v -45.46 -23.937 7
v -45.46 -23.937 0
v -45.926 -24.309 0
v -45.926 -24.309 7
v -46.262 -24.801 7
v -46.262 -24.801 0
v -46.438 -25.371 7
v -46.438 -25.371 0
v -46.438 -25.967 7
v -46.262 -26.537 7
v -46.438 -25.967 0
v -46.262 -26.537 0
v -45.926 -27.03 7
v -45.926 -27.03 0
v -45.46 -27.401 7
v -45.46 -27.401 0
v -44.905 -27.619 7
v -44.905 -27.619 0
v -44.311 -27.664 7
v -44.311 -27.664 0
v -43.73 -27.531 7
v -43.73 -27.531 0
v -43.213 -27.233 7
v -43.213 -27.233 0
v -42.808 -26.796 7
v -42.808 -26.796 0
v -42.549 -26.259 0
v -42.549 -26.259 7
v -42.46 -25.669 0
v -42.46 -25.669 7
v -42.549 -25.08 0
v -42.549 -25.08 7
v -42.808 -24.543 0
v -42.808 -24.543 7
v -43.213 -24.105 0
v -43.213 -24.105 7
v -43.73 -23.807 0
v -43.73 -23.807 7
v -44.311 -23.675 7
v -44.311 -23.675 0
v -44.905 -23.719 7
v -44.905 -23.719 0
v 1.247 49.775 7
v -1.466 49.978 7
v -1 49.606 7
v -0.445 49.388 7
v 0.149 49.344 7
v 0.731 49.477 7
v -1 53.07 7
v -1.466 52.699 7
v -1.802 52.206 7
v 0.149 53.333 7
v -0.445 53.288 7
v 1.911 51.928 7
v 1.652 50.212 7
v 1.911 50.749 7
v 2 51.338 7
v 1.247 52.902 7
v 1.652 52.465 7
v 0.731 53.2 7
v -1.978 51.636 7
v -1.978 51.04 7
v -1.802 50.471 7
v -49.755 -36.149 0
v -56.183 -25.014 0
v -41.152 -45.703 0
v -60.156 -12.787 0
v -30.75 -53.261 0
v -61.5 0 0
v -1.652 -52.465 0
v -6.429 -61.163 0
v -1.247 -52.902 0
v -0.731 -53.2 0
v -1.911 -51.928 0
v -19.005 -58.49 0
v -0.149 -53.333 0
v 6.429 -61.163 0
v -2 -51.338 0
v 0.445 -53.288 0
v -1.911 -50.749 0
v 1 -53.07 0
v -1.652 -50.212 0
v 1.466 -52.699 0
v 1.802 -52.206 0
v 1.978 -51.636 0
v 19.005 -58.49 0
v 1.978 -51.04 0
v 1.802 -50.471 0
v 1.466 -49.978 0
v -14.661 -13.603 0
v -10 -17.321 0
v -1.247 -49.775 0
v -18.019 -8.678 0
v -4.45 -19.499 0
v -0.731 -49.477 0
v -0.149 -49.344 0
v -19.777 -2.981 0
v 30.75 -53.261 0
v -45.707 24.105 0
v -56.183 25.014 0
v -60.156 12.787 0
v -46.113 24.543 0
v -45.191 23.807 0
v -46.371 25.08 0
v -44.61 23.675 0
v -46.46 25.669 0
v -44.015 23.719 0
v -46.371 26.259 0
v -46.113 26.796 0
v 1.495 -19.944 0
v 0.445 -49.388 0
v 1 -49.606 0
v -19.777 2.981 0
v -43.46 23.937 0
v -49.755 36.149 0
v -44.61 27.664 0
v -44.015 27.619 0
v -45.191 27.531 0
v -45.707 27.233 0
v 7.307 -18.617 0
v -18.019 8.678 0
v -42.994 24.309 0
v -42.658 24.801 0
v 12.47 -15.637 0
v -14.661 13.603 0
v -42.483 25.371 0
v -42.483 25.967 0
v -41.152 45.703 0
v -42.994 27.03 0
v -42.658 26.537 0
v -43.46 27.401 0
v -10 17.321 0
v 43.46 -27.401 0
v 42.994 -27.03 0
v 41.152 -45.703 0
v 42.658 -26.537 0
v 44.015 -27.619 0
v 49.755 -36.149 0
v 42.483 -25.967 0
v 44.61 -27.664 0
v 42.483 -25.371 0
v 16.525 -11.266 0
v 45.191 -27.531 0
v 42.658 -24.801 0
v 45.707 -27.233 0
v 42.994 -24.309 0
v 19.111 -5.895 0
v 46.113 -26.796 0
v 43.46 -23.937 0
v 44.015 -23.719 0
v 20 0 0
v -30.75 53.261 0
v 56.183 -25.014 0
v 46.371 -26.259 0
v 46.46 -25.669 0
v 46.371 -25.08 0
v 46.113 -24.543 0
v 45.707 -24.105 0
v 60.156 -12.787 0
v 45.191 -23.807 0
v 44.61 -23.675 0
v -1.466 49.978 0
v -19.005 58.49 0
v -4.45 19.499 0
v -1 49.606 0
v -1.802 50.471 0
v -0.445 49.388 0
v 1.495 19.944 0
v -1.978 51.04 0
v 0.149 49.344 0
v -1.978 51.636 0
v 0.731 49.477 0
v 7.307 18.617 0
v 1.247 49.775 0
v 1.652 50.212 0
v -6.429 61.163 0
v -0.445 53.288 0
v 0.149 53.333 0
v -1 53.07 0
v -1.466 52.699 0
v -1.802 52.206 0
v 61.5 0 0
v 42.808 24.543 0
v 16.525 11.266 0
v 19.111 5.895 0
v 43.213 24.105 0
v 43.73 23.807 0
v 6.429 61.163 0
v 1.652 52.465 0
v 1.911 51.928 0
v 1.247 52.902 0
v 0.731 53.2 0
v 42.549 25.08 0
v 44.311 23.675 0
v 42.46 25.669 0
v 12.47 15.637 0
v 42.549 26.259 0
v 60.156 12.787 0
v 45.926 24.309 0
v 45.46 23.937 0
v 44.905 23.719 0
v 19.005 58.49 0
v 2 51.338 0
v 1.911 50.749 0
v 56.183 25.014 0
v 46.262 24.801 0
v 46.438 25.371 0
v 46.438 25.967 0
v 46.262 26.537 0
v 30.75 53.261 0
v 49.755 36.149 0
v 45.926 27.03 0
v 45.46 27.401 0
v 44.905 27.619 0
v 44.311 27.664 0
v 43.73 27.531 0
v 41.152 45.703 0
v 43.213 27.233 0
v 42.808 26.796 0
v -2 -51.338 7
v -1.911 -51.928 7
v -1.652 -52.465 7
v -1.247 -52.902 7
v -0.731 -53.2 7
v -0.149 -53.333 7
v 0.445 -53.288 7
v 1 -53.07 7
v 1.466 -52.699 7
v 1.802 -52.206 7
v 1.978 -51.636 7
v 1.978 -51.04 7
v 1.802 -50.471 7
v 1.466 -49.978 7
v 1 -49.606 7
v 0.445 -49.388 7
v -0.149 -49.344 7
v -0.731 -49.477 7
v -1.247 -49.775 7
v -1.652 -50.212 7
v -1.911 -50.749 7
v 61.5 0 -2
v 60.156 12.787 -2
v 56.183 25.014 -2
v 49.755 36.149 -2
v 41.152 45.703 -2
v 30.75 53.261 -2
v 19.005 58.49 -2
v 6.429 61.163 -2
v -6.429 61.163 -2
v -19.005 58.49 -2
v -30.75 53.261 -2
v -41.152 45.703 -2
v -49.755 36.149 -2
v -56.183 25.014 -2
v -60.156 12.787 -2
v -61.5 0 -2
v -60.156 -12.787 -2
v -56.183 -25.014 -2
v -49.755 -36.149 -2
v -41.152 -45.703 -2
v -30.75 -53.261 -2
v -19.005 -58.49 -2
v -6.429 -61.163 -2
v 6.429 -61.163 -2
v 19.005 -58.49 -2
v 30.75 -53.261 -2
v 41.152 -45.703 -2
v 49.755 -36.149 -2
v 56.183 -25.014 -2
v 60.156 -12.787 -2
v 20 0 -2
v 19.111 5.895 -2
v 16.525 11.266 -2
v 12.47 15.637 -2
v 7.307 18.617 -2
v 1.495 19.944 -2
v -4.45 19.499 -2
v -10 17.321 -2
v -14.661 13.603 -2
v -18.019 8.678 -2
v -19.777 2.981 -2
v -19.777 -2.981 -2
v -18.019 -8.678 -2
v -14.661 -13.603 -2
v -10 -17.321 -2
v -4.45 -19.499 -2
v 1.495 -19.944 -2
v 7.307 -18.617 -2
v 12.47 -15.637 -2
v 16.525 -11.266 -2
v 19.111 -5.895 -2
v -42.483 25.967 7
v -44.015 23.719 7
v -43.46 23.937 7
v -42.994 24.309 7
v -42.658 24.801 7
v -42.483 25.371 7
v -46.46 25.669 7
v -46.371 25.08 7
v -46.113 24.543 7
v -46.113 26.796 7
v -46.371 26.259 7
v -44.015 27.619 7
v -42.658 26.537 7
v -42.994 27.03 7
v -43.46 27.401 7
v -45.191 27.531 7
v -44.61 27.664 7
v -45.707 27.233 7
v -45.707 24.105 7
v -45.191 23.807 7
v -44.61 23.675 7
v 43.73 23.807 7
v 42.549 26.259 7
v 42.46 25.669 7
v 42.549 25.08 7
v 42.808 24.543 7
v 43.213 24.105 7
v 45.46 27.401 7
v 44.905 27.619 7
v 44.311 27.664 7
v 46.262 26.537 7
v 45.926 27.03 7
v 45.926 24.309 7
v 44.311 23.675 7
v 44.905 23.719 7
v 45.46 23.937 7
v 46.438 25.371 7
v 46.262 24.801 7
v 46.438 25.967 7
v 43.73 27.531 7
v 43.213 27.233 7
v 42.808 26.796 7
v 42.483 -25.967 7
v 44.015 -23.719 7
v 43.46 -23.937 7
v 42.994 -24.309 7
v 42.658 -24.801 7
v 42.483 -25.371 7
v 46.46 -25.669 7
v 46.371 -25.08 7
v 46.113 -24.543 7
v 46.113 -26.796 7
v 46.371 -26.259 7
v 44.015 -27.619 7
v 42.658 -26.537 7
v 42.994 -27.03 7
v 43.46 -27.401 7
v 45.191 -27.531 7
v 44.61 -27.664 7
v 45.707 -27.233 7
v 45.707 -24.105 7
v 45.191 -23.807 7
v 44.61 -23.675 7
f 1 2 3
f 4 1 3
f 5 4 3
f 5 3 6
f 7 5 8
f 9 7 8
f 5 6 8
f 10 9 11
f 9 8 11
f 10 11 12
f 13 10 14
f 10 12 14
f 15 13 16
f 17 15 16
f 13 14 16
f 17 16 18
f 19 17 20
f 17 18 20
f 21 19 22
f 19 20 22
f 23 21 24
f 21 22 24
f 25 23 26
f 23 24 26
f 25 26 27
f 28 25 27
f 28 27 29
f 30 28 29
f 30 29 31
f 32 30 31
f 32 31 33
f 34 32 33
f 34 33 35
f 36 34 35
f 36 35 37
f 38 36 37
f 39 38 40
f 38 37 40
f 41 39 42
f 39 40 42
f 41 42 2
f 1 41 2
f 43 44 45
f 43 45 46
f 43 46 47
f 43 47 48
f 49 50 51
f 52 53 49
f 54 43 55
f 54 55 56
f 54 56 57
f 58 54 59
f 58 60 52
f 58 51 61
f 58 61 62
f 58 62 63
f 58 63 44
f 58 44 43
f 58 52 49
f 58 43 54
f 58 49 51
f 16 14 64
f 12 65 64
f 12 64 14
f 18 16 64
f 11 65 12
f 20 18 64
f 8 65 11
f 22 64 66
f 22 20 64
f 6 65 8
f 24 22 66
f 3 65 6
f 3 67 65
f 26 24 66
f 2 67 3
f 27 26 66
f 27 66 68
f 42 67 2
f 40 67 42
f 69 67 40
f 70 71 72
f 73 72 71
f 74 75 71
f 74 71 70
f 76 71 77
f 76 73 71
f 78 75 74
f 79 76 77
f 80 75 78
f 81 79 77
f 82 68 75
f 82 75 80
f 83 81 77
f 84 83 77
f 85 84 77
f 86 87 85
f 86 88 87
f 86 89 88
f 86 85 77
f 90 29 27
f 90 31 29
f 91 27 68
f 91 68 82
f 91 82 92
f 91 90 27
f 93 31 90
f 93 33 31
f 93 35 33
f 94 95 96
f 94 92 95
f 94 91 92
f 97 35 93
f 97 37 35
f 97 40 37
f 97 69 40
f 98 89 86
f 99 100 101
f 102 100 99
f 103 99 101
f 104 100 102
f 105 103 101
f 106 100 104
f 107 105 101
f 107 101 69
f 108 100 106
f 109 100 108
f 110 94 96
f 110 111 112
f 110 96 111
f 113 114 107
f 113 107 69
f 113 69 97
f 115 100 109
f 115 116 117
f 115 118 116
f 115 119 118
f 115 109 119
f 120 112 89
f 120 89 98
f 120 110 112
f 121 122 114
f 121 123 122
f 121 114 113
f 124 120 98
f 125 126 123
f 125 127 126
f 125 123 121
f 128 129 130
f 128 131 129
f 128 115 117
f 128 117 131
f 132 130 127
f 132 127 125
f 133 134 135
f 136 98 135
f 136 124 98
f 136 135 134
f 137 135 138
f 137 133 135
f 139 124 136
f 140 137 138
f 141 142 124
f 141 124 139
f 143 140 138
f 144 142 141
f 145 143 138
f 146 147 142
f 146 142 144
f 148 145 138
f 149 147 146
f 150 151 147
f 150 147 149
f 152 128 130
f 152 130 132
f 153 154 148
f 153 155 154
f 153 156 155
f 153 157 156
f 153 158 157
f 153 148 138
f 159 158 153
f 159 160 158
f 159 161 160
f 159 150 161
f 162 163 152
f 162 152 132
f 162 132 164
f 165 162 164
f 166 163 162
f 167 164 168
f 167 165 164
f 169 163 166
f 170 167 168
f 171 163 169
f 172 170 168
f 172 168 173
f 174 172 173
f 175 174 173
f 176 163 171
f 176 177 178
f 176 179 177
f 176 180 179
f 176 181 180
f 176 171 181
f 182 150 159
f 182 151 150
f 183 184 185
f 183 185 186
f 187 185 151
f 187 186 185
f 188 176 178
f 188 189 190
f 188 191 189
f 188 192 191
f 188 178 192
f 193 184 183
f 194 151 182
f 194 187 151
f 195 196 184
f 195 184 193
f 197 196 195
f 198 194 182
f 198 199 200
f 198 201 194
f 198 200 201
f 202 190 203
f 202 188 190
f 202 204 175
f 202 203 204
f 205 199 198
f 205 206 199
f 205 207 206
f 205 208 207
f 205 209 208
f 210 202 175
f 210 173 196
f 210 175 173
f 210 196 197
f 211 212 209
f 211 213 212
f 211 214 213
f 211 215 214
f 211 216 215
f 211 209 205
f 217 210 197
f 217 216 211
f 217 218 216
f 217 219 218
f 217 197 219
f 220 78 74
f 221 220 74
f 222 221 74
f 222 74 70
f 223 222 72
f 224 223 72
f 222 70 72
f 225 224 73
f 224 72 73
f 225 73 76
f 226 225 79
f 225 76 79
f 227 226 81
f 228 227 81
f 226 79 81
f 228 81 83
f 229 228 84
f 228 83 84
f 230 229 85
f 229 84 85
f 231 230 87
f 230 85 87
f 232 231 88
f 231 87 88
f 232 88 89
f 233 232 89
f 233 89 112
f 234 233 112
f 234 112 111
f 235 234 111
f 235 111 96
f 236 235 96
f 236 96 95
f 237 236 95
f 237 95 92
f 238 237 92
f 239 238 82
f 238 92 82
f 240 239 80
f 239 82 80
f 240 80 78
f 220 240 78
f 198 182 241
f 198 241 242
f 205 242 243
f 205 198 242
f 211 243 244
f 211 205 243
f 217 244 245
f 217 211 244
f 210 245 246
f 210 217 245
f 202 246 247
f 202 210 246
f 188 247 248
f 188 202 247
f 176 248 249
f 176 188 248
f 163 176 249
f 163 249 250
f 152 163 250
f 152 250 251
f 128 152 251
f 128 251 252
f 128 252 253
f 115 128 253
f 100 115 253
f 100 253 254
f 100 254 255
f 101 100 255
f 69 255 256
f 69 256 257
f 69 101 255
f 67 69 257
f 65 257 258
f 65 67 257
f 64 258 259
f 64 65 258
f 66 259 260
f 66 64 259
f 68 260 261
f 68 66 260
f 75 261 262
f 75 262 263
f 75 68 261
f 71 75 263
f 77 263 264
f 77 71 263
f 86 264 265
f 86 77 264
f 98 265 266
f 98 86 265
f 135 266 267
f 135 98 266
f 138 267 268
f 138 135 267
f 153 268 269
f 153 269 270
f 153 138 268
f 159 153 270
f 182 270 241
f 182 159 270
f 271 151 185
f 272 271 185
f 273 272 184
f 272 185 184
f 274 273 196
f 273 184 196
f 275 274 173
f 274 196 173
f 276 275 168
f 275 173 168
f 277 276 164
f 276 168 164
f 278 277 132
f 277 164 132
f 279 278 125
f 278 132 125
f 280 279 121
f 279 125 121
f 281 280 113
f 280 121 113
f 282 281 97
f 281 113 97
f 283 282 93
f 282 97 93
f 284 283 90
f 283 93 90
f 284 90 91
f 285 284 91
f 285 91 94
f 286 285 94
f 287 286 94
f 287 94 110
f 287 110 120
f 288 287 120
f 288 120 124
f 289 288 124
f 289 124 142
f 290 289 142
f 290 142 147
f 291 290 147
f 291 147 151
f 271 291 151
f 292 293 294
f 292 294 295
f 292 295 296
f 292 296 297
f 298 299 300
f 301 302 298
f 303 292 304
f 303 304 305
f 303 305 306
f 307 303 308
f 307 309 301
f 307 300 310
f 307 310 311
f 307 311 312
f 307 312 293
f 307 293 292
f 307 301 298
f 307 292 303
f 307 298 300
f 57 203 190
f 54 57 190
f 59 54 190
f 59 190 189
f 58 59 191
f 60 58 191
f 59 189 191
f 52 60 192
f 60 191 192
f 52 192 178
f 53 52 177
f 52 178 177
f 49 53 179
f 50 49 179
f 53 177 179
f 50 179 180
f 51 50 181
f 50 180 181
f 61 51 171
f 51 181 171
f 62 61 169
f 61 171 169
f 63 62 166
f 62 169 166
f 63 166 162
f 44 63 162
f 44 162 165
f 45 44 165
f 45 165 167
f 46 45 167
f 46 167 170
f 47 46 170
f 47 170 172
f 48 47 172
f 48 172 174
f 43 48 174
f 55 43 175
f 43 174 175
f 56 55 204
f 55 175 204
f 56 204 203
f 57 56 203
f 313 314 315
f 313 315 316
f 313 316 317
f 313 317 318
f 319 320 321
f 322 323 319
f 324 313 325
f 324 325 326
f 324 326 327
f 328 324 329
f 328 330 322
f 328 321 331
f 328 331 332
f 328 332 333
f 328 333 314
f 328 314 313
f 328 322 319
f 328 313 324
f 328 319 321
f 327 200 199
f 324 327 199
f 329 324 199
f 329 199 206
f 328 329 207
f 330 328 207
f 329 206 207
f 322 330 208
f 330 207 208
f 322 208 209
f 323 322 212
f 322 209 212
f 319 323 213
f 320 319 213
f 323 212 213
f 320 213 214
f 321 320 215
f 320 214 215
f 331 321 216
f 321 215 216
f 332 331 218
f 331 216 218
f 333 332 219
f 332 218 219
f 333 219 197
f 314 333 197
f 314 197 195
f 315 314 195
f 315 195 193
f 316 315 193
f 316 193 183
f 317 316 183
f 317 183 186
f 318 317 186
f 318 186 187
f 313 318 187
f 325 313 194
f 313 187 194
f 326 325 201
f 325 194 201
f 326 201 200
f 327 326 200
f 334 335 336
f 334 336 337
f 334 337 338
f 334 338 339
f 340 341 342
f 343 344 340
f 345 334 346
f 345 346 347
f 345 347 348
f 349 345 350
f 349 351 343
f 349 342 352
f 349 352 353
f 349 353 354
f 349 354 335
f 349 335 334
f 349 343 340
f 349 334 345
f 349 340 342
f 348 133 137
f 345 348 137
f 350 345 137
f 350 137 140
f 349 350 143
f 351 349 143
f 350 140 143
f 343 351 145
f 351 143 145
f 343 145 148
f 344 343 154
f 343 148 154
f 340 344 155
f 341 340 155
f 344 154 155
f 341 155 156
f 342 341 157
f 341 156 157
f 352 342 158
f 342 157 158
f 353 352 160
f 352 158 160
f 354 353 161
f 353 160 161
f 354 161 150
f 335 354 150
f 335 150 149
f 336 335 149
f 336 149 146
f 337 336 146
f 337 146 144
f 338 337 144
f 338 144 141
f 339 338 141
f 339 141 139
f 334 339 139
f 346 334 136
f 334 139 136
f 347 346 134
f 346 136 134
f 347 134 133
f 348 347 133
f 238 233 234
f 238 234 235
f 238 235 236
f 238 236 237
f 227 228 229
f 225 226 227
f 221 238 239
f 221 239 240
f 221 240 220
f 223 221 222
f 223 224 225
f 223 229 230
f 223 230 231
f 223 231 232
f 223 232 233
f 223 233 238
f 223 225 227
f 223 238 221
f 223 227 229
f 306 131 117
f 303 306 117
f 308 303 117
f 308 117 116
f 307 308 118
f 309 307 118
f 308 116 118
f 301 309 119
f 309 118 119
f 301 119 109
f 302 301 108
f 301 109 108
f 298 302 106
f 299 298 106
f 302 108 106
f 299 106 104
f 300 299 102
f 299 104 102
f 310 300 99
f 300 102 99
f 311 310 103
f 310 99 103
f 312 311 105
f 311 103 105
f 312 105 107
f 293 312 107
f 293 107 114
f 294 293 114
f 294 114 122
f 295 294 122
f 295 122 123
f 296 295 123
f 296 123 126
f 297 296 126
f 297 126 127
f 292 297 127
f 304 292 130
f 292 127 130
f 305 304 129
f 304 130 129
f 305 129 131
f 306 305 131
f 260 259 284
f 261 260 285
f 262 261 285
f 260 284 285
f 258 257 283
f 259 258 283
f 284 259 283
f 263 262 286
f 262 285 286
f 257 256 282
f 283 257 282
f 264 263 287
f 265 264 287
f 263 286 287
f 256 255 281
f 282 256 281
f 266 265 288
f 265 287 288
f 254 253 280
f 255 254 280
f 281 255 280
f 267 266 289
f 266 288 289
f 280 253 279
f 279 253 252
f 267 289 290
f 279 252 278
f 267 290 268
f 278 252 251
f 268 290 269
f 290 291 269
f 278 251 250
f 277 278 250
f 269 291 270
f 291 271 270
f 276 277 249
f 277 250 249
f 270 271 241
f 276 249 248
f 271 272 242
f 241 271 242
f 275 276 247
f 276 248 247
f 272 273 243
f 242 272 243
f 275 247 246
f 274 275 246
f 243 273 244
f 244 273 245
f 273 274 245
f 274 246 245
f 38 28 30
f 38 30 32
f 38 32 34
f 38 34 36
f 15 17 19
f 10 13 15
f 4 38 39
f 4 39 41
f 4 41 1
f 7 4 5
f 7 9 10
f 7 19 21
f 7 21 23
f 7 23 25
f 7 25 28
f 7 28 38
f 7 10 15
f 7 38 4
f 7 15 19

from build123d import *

# Parameters (mm, degrees)
SKETCH1_R           = 61.5
BOSS_EXTRUDE1_DEPTH = 2
SKETCH2_R           = 2
BOSS_EXTRUDE2_DEPTH = 7
CIRPATTERN1_COUNT   = 6
SKETCH1_3_R         = 20
CUT_EXTRUDE1_DEPTH  = 88.255372327


with BuildPart() as part:
    # Sketch1 → Boss-Extrude1 (new body)
    with BuildSketch(Plane.XY):
        Circle(SKETCH1_R)
    extrude(amount=-BOSS_EXTRUDE1_DEPTH)

    # Sketch2 → Boss-Extrude2 (add)
    with BuildSketch(Plane.XY):
        with Locations((0, 51.338311715)):
            Circle(SKETCH2_R)
    boss_extrude2 = extrude(amount=BOSS_EXTRUDE2_DEPTH)

    # CirPattern1: Boss-Extrude2 ×6 about axis
    cirpattern1_axis = Axis((0, 0, 0), (0, 0, -1))
    for i in range(1, CIRPATTERN1_COUNT):
        add(boss_extrude2.rotate(cirpattern1_axis, i * 360 / CIRPATTERN1_COUNT))

    # Sketch1<3> → Cut-Extrude1 (cut, through all)
    with BuildSketch(Plane.XY):
        Circle(SKETCH1_3_R)
    extrude(amount=-CUT_EXTRUDE1_DEPTH, mode=Mode.SUBTRACT)


solid = part.part
